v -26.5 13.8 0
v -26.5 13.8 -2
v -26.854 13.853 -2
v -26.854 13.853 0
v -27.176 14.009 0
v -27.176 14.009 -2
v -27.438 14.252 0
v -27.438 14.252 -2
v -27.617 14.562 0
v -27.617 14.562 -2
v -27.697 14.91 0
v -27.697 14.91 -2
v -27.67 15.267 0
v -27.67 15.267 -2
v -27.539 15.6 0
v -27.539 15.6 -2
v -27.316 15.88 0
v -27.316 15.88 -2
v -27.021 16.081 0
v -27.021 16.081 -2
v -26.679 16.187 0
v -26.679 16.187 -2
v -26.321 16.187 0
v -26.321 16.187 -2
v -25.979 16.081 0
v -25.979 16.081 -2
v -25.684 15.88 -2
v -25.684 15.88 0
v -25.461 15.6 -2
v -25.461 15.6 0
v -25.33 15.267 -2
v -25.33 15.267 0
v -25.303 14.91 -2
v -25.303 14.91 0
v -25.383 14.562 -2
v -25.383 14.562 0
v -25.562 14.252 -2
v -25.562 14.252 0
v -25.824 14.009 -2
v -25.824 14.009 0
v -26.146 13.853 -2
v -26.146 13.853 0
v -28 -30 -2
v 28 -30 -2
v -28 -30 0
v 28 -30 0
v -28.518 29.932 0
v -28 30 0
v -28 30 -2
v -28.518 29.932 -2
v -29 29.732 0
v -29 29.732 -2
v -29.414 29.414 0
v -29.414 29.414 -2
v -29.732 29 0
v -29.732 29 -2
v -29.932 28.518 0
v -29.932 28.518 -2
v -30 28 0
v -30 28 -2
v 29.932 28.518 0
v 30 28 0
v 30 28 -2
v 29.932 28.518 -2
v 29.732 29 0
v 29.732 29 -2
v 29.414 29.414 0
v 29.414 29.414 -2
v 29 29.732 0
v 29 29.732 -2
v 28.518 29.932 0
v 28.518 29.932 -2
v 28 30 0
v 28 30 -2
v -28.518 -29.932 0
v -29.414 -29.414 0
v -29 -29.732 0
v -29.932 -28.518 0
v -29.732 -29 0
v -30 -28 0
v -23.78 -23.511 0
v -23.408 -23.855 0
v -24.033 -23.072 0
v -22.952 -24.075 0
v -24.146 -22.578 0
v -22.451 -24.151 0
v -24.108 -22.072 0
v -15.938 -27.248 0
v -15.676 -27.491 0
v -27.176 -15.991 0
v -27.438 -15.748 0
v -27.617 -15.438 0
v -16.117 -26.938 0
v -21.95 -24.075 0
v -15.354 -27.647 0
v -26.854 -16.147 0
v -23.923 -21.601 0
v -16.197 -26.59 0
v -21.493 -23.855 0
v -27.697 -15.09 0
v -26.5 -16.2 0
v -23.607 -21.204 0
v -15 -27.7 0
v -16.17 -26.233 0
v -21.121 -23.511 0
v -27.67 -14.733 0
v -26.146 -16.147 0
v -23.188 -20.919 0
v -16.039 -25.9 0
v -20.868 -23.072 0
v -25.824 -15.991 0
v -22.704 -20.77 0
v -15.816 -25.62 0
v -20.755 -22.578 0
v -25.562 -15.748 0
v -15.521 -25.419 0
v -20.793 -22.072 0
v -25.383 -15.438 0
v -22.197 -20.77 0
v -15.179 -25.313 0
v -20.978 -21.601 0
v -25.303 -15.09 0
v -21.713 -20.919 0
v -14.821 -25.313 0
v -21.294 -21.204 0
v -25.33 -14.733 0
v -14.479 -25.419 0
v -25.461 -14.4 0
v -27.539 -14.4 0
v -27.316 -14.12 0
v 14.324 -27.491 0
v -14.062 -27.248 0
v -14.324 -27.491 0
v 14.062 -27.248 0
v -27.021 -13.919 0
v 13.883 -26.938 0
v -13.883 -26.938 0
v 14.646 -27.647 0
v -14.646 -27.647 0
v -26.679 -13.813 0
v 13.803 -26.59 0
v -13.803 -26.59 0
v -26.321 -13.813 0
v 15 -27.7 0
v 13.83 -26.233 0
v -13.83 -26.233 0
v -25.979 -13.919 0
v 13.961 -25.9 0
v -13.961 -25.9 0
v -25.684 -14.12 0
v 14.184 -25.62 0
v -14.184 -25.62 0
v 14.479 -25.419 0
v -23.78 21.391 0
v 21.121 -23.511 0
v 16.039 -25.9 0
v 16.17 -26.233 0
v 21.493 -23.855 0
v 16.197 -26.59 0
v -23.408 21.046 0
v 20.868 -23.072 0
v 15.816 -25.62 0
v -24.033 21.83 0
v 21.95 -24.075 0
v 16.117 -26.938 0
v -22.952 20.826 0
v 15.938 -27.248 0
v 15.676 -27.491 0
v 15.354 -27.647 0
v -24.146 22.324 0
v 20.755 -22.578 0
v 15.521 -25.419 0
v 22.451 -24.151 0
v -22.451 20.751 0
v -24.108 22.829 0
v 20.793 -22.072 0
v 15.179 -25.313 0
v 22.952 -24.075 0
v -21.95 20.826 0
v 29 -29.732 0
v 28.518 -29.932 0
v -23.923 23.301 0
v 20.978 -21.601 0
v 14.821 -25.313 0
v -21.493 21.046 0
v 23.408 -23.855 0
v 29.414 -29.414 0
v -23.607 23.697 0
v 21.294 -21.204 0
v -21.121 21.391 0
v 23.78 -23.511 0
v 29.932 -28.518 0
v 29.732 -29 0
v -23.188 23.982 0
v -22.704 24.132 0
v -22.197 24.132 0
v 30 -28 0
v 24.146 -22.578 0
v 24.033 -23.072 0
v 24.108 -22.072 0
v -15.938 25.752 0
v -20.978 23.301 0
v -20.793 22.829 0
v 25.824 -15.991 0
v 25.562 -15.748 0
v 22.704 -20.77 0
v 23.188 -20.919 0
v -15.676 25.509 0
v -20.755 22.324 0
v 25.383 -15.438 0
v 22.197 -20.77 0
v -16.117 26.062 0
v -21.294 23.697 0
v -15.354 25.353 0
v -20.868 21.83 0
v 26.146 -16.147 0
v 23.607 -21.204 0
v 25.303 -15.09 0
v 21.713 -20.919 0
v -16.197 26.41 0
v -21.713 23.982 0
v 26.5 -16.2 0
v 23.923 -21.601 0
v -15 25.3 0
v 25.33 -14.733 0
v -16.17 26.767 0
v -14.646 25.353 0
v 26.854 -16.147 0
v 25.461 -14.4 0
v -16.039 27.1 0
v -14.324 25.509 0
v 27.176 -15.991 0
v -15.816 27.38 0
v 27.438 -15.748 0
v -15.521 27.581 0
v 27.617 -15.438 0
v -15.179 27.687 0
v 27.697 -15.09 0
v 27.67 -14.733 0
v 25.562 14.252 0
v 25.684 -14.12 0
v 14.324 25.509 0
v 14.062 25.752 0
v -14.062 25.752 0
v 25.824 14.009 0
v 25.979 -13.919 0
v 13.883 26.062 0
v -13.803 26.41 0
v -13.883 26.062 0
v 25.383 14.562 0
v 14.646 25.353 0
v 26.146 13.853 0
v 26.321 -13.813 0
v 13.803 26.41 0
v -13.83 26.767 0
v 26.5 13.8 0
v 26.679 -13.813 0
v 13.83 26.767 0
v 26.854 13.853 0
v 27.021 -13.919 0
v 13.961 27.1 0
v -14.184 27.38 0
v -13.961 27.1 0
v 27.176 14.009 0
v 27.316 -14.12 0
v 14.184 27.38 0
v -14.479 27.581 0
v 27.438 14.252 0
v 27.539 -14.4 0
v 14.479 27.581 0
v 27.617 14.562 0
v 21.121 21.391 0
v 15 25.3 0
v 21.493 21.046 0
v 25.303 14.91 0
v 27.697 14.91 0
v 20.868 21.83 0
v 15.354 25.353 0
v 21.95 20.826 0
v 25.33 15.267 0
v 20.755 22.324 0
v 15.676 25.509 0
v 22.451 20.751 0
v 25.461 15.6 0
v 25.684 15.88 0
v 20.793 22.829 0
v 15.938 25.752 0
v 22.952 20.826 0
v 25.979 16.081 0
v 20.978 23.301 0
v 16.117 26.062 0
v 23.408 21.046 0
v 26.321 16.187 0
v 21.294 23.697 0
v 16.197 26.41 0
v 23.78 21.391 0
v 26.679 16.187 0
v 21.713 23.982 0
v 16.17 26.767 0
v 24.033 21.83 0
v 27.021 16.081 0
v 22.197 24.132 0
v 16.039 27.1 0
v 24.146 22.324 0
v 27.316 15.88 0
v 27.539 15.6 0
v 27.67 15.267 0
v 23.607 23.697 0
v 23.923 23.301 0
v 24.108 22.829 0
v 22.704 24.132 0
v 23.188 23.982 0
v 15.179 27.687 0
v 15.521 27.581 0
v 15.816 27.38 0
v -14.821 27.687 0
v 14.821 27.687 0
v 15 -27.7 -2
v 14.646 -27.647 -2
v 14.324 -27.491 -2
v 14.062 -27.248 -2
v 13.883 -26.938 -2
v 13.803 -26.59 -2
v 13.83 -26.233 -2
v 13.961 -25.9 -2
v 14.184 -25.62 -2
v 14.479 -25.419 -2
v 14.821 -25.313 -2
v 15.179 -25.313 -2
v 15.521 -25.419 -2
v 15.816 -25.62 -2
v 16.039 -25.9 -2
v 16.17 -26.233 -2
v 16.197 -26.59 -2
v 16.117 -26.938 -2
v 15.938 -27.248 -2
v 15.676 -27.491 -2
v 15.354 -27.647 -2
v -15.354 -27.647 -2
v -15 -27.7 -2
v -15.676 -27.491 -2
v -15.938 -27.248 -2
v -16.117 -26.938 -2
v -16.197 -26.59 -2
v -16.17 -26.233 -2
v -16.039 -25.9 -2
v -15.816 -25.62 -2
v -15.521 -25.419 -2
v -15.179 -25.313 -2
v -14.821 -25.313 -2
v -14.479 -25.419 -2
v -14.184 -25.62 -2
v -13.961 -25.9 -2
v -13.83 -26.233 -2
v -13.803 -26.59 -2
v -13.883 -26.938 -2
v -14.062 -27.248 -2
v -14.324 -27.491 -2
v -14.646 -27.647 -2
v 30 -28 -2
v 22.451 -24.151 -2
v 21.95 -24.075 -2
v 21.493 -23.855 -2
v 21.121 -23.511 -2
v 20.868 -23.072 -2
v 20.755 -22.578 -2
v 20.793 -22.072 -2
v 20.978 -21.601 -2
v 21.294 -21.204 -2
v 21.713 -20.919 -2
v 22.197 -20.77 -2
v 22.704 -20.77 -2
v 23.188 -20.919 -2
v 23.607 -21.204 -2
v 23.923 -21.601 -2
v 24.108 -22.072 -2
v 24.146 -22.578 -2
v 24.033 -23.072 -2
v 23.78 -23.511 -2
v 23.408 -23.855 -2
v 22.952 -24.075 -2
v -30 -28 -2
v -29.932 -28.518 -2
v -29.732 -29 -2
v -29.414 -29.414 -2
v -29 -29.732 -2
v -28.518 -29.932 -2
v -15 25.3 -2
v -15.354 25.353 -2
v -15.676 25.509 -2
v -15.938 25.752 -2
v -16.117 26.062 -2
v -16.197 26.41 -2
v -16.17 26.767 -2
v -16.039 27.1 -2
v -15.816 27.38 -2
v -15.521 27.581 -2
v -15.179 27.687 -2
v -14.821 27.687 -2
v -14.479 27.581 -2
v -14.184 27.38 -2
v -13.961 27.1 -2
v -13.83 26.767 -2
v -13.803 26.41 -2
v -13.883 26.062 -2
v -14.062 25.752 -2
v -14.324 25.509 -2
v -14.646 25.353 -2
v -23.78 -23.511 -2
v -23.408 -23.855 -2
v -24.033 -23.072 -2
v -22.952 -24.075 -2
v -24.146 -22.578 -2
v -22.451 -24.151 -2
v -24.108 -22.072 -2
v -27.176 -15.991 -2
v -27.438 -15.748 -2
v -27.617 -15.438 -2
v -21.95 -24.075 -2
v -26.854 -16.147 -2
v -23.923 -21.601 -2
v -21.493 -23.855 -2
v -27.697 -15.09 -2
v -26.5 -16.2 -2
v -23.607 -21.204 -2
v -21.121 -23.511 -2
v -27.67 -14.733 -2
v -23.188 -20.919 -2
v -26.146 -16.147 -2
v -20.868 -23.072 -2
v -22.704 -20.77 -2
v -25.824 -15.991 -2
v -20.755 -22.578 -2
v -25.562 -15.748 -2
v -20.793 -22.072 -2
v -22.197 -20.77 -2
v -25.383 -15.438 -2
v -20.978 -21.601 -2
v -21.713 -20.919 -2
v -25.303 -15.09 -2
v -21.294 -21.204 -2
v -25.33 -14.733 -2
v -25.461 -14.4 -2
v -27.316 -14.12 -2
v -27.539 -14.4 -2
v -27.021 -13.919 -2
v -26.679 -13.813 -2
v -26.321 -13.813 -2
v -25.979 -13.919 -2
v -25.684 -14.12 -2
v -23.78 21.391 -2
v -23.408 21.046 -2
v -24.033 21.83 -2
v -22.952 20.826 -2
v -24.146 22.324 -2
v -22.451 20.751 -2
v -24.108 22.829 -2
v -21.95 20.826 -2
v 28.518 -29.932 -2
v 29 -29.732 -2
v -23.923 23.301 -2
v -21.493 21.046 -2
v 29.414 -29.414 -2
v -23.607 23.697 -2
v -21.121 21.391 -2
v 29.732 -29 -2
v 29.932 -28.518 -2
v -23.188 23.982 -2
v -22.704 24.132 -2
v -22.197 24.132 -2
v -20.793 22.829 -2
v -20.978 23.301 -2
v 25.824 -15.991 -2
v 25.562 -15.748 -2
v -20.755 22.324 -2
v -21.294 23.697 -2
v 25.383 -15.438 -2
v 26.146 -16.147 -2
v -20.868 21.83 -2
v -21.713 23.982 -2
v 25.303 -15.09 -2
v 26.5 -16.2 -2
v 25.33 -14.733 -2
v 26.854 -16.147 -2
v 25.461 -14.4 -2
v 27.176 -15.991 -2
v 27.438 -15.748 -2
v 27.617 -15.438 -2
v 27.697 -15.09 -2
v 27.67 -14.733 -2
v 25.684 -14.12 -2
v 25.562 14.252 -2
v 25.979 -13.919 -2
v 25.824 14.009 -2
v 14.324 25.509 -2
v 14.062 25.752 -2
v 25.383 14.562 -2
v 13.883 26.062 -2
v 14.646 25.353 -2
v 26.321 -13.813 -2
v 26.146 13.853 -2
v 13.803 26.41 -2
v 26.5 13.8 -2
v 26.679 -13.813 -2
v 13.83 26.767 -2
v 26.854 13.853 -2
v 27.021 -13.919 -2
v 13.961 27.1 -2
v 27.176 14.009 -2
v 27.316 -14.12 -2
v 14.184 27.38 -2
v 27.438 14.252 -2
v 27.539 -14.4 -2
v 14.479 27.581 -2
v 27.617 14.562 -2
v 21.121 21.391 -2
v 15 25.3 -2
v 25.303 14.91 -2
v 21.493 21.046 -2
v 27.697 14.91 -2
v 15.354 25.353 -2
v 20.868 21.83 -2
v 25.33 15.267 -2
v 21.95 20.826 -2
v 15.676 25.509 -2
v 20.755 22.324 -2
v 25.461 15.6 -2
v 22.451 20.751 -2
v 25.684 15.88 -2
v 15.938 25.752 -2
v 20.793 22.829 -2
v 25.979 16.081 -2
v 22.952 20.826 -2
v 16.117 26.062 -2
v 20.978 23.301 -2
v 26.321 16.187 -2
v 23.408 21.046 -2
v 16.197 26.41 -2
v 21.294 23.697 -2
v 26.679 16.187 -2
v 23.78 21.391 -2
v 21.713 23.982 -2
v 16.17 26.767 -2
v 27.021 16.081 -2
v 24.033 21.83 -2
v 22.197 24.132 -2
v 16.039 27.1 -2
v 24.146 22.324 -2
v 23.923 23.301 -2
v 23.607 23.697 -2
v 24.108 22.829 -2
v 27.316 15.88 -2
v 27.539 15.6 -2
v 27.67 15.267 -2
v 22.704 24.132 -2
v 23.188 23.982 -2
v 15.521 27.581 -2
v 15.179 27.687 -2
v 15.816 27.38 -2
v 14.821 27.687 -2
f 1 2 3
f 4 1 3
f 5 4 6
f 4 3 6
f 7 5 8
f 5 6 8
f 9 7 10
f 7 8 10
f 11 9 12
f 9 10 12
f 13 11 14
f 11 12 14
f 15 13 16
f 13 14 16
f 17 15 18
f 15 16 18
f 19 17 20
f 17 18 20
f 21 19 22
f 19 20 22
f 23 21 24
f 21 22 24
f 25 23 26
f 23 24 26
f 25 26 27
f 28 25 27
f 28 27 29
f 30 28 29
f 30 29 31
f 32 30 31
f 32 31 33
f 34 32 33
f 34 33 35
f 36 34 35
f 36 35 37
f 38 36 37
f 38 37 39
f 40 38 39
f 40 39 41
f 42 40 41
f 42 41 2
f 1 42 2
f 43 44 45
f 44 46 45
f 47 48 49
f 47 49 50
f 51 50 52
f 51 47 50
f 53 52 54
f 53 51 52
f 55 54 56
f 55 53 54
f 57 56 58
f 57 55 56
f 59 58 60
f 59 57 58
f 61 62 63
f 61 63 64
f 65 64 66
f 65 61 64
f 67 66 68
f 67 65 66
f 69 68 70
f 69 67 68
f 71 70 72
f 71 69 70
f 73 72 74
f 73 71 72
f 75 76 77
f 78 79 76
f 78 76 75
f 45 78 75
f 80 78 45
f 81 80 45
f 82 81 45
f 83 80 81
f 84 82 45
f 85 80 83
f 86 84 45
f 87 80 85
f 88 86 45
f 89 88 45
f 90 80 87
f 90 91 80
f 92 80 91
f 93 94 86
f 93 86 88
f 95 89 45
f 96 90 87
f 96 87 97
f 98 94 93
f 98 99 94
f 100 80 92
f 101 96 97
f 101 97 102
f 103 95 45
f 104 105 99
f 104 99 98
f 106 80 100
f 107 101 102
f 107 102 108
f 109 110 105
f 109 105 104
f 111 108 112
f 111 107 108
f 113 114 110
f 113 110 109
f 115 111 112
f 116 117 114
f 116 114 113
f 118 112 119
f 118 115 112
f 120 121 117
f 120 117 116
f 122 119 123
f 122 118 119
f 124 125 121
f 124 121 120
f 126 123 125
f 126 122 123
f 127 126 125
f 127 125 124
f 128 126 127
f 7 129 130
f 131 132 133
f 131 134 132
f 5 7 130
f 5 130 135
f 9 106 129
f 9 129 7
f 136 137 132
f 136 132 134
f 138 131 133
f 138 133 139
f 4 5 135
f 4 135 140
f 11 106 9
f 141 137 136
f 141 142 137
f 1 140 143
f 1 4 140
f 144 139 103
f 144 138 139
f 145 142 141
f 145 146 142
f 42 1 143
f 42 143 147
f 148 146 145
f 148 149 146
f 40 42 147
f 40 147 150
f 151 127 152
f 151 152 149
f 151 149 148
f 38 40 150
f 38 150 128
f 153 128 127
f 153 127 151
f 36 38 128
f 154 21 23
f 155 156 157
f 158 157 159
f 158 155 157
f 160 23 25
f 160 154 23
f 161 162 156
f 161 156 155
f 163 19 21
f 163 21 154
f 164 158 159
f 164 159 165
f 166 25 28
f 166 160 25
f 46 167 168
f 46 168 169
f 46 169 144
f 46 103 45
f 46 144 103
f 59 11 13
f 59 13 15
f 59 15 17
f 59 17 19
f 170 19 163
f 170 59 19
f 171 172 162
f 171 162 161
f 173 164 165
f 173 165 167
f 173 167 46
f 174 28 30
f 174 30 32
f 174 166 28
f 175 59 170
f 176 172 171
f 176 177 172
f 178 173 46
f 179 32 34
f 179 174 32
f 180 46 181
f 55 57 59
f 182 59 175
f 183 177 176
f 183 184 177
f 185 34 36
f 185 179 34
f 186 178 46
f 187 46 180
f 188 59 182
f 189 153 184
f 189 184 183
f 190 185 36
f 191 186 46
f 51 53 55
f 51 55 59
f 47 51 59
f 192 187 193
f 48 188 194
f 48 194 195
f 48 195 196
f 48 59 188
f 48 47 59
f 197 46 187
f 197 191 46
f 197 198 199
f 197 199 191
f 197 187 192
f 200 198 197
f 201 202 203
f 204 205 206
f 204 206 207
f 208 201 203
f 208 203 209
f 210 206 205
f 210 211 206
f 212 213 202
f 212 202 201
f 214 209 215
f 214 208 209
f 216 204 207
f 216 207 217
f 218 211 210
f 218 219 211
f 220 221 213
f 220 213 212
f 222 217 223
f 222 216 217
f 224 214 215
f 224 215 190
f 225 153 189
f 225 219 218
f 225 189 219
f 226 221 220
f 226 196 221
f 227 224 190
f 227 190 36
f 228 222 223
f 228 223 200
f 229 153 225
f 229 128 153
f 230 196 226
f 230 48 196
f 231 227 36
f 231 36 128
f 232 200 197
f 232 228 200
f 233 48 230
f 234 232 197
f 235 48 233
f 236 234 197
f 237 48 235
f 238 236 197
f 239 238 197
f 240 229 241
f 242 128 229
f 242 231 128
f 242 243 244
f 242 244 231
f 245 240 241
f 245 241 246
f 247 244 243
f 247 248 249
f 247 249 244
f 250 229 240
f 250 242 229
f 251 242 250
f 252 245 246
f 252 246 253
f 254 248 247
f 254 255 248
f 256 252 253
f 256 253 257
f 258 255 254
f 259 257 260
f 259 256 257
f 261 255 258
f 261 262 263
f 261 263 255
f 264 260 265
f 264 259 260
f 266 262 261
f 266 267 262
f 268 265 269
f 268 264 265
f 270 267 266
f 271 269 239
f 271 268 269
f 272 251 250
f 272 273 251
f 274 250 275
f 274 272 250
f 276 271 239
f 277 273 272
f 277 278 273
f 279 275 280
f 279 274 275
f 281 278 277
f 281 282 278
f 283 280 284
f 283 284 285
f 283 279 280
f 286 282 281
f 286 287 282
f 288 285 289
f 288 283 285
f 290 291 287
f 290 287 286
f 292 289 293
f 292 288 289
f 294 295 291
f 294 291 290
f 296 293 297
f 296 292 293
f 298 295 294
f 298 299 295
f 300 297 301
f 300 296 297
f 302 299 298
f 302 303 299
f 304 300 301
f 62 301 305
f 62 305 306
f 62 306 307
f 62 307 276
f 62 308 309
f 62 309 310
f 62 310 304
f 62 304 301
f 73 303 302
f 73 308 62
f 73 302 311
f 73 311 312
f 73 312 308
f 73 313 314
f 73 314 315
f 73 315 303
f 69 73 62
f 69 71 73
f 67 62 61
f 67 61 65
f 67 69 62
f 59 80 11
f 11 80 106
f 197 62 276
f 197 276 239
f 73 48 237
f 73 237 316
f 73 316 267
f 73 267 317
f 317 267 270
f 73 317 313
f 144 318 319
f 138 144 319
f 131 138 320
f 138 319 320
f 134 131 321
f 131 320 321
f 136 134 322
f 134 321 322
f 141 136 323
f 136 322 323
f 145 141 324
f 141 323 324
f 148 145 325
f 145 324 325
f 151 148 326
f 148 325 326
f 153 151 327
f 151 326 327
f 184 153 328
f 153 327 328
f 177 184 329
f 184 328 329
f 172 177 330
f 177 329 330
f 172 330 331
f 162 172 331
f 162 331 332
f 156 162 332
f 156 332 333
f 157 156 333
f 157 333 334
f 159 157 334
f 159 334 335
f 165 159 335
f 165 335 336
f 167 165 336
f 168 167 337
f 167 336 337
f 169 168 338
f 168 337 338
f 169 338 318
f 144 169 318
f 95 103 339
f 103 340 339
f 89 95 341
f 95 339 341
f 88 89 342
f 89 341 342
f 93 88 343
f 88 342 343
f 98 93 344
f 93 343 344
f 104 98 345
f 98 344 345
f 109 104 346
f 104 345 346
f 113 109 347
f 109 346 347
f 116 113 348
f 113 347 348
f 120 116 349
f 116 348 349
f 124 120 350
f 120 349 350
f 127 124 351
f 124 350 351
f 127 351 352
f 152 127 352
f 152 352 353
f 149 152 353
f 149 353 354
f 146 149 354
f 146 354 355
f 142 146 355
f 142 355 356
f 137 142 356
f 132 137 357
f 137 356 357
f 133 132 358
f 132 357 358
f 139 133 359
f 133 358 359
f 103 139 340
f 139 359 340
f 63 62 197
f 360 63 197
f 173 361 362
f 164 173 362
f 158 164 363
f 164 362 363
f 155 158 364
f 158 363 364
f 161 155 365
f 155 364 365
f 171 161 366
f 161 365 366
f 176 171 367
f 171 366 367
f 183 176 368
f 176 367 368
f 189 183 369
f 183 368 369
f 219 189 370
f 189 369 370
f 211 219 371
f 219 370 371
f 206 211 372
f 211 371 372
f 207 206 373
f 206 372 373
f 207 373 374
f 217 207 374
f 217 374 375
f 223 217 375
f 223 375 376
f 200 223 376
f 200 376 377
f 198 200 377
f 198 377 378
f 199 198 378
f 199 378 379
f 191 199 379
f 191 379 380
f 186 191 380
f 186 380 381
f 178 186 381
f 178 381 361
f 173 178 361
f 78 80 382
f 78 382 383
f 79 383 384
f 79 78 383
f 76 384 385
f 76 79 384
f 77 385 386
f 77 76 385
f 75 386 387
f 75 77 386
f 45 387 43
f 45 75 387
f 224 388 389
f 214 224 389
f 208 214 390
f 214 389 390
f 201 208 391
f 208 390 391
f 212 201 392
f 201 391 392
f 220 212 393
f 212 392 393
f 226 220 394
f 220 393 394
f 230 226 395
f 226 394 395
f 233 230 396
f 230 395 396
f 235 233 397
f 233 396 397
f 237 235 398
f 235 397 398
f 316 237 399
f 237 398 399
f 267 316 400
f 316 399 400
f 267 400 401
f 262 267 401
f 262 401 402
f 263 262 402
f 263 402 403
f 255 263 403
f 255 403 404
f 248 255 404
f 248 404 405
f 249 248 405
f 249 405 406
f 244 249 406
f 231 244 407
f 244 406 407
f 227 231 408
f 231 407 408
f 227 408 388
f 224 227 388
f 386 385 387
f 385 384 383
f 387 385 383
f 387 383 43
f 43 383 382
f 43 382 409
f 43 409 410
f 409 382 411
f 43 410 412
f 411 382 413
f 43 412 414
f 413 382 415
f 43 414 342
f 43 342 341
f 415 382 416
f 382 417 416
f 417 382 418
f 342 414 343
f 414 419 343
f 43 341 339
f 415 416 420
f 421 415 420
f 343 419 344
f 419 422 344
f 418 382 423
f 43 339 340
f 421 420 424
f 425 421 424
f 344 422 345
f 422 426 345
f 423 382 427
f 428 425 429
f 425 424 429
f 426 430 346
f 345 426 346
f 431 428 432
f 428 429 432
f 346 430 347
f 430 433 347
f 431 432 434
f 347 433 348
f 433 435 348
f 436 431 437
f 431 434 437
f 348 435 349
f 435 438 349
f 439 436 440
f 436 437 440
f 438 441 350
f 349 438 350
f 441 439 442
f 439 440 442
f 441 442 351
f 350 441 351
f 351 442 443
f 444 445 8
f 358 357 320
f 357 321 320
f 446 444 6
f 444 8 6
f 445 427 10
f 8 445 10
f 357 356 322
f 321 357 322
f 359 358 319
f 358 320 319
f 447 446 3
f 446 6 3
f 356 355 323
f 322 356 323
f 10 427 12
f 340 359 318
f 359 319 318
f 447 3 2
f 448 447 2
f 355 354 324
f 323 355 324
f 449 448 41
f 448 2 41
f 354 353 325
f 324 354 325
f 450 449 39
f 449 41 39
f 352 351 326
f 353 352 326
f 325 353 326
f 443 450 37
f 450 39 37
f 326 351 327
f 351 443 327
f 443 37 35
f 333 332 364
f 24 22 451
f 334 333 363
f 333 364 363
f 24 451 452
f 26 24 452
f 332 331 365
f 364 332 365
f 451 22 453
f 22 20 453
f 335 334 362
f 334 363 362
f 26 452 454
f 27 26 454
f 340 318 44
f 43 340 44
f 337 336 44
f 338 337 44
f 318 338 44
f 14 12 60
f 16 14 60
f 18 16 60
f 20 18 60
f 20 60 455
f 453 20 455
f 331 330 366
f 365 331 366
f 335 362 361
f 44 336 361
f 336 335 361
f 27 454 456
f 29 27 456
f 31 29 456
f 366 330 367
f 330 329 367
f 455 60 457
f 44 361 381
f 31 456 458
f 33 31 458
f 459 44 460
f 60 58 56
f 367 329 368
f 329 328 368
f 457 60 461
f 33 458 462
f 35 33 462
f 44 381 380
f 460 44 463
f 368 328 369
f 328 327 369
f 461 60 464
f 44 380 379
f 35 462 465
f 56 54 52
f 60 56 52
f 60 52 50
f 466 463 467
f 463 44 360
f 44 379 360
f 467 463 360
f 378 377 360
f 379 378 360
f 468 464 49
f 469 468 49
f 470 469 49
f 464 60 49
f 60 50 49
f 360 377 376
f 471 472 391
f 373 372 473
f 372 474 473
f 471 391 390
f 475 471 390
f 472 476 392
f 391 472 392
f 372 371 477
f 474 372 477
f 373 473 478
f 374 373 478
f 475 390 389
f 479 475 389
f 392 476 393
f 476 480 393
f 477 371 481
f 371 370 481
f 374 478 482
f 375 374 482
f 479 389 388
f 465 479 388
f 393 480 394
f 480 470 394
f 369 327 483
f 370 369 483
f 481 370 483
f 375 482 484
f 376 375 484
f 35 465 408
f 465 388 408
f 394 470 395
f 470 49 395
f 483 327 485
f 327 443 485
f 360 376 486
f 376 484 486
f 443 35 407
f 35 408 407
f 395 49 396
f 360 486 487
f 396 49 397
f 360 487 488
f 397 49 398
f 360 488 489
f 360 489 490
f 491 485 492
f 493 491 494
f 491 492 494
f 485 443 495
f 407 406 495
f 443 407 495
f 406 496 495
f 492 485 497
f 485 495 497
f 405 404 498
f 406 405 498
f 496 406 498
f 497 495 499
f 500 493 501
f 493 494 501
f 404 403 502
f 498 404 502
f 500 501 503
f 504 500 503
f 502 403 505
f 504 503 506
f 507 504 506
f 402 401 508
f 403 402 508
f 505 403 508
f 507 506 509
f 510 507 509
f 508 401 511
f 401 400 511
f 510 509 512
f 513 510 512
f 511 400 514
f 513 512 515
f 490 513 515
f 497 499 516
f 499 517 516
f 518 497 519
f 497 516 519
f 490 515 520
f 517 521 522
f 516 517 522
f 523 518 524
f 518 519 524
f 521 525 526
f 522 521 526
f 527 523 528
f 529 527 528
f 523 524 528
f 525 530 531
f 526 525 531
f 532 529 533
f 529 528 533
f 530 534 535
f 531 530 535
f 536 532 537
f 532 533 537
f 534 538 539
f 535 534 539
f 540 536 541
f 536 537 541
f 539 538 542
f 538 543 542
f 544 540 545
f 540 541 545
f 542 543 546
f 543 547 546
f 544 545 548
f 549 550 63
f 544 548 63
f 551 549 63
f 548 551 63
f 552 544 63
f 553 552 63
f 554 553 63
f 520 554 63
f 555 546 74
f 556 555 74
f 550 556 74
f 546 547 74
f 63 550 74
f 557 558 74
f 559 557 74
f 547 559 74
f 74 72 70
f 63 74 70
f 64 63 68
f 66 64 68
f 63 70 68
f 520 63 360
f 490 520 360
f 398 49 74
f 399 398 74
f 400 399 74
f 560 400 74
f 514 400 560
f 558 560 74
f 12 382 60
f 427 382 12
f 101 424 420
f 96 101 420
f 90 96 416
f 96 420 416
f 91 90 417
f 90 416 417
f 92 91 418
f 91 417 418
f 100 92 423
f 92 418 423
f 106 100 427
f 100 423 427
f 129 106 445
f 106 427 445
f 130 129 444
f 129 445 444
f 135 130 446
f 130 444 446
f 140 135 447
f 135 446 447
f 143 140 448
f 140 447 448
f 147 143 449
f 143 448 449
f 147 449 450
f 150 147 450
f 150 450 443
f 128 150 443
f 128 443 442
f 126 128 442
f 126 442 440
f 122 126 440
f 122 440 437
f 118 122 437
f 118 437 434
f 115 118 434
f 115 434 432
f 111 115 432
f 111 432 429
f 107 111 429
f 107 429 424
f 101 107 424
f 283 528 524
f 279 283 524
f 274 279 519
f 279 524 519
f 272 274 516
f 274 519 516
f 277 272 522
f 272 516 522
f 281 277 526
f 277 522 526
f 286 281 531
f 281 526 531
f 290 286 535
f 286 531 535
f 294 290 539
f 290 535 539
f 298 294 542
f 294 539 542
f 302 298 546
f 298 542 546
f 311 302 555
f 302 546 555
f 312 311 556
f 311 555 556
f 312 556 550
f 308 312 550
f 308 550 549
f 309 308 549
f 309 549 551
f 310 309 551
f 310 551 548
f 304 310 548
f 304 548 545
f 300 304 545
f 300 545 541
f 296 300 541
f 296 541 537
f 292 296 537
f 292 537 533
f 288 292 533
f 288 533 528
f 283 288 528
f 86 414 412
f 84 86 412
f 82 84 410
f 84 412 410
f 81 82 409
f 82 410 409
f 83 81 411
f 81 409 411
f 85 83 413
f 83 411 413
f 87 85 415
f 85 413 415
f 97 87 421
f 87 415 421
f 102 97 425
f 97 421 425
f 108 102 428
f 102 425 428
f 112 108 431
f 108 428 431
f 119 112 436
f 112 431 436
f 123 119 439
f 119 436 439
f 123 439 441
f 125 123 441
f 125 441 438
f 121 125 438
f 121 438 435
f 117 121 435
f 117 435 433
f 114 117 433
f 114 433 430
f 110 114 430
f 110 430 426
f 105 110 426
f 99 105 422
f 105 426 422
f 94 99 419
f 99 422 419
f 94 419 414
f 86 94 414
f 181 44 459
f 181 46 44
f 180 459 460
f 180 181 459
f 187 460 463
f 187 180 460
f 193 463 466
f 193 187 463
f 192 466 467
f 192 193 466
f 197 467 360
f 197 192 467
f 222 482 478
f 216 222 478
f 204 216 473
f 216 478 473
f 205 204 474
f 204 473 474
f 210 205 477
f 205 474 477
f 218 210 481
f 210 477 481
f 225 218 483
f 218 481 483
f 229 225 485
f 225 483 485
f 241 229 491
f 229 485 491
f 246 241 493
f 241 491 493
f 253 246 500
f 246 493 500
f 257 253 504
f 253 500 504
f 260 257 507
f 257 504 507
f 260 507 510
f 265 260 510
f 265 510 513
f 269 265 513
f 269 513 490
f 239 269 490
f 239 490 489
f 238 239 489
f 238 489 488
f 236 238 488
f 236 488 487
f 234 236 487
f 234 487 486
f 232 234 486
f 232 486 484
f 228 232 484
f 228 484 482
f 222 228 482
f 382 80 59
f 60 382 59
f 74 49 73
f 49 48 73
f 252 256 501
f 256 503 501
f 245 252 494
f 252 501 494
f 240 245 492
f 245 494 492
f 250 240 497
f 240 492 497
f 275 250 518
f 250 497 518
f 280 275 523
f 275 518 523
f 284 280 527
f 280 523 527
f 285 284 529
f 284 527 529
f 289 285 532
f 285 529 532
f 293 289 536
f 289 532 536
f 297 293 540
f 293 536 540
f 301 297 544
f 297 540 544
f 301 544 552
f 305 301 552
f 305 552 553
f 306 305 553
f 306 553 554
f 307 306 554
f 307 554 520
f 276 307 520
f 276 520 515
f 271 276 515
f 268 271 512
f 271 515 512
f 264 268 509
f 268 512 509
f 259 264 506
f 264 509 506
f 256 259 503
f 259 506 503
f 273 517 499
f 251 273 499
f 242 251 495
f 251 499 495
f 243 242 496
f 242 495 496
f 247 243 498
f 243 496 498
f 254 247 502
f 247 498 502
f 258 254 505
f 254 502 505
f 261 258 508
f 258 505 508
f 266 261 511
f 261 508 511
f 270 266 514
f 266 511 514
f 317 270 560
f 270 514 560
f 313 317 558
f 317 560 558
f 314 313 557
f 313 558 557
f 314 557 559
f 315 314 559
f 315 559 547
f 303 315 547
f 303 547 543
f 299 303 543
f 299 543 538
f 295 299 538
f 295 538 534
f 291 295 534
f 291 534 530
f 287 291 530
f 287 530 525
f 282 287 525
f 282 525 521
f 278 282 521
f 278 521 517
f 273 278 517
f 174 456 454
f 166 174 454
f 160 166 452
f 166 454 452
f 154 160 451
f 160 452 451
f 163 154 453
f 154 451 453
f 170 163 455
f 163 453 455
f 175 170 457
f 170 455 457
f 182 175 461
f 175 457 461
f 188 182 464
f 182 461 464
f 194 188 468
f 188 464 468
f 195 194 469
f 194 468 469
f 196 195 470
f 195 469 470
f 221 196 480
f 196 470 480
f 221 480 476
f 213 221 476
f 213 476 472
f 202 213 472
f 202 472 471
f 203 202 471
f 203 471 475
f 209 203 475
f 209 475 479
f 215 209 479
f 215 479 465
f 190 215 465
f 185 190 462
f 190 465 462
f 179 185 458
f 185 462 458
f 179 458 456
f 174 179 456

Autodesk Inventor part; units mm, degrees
ref_plane "YZ Plane" through (0, 0, 0) normal (1, 0, 0) x (0, 1, 0)
ref_plane "XZ Plane" through (0, 0, 0) normal (0, 1, 0) x (-1, 0, 0)
ref_plane "XY Plane" through (0, 0, 0) normal (0, 0, 1) x (1, 0, 0)
sketch "Sketch1" plane through (0, 0, 0) normal (0, 0, 1) x (1, 0, 0)
  line L0 (0, -42.5799) -> (0, 42.5799) projected
  line L1 (-42.5799, 0) -> (42.5799, 0) projected
  line L2 (-28, 30) -> (28, 30)
  line L3 (30, 28) -> (30, -28)
  line L4 (28, -30) -> (-28, -30)
  line L5 (-30, -28) -> (-30, 28)
  arc A0 (-28, 30) -> (-30, 28) centre (-28, 28) ccw
  arc A1 (30, 28) -> (28, 30) centre (28, 28) ccw
  arc A2 (28, -30) -> (30, -28) centre (28, -28) ccw
  arc A3 (-30, -28) -> (-28, -30) centre (-28, -28) ccw
  point P0 (0, 0)
  point P1 (-30, 30)
  point P2 (30, 30)
  point P3 (-22.4506, 22.4506)
  point P4 (-26.5, 15)
  point P5 (-15, 26.5)
  point P6 (-15, -26.5)
  point P7 (-22.4506, -22.4506)
  point P8 (-26.5, -15)
  point P9 (26.5, -15)
  point P10 (22.4506, -22.4506)
  point P11 (15, -26.5)
  point P12 (15, 26.5)
  point P13 (22.4506, 22.4506)
  point P14 (26.5, 15)
  dimension "d0" = 60
  dimension "d1" = 2
  dimension "d2" = 22.4506
  dimension "d3" = 22.4506
  dimension "d4" = 15
  dimension "d5" = 15
  dimension "d6" = 3.5
  dimension "d7" = 3.5
  dimension "d10" = 360
extrude "Extrusion1" add sketch "Sketch1" against normal blind 2
hole "Hole1" at (-22.4506, 22.4506, 0) at (22.4506, 22.4506, 0) at (22.4506, -22.4506, 0) at (-22.4506, -22.4506, 0) direction (0, 0, -1) diameter 3.4 end through all clearance for "Countersunk Flat Head Screw DIN EN ISO 2009" size "M3" standard "DIN"
hole "Hole2" at (-26.5, 15, 0) at (-15, 26.5, 0) at (-15, -26.5, 0) at (-26.5, -15, 0) at (26.5, -15, 0) at (15, -26.5, 0) at (15, 26.5, 0) at (26.5, 15, 0) direction (0, 0, -1) diameter 2.4 end through all clearance for "Countersunk Flat Head Screw DIN EN ISO 2009" size "M2" standard "DIN"
equation "\"d0\" = backplate_width"
equation "\"d2\" = hole_distance"
equation "\"d3\" = hole_distance"
equation "\"d4\" = screw_distance_center"
equation "\"d5\" = screw_distance_center"
equation "\"d6\" = screw_distance_outside"
equation "\"d7\" = screw_distance_outside"
equation "\"d12\" = front_plate_thickness"
equation "\"encoder_axis\" = 8"
equation "\"encoder_emboss\" = 0"
equation "\"encoders\" = 0"
equation "\"encoder_width\" = 27"
equation "\"front_plate_thickness\" = 2"
equation "\"glass_thickness\" = 2"
equation "\"screw_distance_outside\" = 3.5"
equation "\"encoder_rad\" = 49"
equation "\"encoder_extrude_hight\" = 3"
equation "\"screw_distance_center\" = 15"
equation "\"ring_top_thickness\" = 2"
equation "\"ring_outer_bevel_depth\" = 0.5"
equation "\"ring_depth\" = 6"
equation "\"ring_outer_bevel_height\" = 3"
equation "\"ring_inner_bevel_depth\" = 3.5"
equation "\"ring_thickness\" = 9"
equation "\"hole_from_center\" = 63.5"
equation "\"circle_dimension_inner\" = 47"
equation "\"circle_dimension\" = 56"
equation "\"backplate_width\" = 60"
equation "\"hole_distance\" = 22.45064"
properties part number "FrontGlass" material "Polycarbonate, Clear"
